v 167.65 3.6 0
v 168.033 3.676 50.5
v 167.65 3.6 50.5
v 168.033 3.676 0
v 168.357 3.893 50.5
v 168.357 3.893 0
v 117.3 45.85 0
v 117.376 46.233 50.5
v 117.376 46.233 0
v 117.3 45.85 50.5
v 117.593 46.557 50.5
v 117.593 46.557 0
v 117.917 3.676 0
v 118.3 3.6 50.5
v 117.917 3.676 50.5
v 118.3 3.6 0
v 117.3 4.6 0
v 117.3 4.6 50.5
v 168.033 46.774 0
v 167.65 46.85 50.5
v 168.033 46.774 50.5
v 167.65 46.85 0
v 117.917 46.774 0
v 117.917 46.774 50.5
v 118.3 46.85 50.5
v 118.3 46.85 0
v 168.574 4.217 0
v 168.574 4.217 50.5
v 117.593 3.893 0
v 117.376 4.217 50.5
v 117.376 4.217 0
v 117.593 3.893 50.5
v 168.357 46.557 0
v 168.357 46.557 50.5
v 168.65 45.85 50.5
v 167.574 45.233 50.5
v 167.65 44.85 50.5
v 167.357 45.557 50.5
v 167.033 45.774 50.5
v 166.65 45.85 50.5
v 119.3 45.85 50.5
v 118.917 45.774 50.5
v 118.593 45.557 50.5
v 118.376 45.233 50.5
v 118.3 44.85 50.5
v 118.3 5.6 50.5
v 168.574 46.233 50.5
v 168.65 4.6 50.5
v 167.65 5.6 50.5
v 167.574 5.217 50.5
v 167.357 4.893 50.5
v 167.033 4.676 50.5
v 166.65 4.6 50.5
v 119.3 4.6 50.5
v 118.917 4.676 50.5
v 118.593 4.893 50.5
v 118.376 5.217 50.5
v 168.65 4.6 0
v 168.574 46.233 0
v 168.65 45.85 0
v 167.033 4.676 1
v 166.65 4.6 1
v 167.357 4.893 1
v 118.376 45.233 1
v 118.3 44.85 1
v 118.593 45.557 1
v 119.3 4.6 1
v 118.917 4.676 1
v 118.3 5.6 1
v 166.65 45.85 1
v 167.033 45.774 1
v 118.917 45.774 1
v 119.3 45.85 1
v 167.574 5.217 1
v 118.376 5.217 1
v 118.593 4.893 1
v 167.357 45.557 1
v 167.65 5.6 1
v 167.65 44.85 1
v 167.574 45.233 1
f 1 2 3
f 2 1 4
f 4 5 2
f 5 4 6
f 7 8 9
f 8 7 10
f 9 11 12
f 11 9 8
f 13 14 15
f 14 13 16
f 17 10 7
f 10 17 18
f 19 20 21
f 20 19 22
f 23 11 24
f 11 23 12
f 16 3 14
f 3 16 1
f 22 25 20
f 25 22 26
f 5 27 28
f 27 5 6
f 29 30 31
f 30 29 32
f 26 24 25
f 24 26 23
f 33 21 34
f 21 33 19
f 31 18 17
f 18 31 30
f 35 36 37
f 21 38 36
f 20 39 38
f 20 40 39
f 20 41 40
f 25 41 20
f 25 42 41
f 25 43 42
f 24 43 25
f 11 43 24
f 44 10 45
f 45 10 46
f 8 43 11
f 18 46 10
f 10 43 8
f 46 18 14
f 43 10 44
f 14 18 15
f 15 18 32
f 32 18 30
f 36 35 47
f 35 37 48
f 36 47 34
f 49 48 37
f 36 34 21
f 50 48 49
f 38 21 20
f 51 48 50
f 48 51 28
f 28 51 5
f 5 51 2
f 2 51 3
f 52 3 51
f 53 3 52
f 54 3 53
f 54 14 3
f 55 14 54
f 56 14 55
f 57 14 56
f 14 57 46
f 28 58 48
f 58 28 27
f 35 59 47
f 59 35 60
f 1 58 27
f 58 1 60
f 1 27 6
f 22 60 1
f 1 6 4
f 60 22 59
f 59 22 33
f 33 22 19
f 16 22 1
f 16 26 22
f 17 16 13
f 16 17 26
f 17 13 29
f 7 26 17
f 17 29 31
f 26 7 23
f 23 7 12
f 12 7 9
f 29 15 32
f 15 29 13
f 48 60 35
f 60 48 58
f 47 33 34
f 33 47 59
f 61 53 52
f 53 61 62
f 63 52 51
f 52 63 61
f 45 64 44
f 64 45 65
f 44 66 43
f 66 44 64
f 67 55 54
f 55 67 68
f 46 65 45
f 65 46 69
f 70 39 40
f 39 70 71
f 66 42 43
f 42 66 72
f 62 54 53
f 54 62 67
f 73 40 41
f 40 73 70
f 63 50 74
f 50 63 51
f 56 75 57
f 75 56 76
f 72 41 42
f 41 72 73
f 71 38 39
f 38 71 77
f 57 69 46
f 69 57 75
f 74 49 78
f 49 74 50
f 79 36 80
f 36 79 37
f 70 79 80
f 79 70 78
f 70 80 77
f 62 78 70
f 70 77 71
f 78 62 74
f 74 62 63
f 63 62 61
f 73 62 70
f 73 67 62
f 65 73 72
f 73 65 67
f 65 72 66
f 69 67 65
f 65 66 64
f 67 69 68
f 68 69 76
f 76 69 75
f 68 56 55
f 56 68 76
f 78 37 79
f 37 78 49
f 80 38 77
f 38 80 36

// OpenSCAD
use <mylib.scad>;
// Organizer for GreatSeas box and components
// nine and half ship upgrade market holders
// four player component boxes: 
// --  action(6) & combat(16+8) cards, ships/dudes (29+2), point-markers, trade posts, ship-class & fleet tiles
// temple risers?, coin tray, wood tray, worker/damage/stat tray, "special action" (temple) cards


p = .001;
pp = 2 * p;
t0 = 1;
f = .18;      // fudge for physical clearance
f1 = .1;      // fudge for display
t2 = 2*t0;    // 2 walls
ty = 1.5 * t0;   // neutral box y-wall thickness

sample = false;  // true to print mini-box

cbw = 140;       // combat board
cbh = 100;
cbz = 8;

mapz = 11.5 + 2; // map thickness reduces availablbe box depth + rule book

// box size and placement constraint (3x4 grid in square box)
boxy = 220;    // internal XY-dim of cardboard box (components must fit within)
boxz = 65 - mapz;    // internal height of cardboard box (components must fit within)

// Garphill 54x86 cards
w00 = sample ? 27 : 54;  // official card size [short dimension]
h00 = sample ? 42 : 86;  // official card size [long dimension]

ds = 12;       // dice size

t00 = 8/24;    // = .333mm card thickness: sleeves 60 mics = .06 mm ==> .393 == .4 with sleeves?
t01 = .400;    // = .33 + .6 mm; thickness when stacking sleeved cards (compressed) TBD when sleeve arrive.

// width of card with sleeves
w0 = w00+2.5;
// height of card with sleeves
h0 = h00+1.5;
npc = 30;    // number of player cards
t1c = t0 * 1;//.7;
csz = t0 + (npc+4) * t01; // player box thick?

combatt = 5;    // thickness of combat status disks
combatd = 18;   // diameter of combat status disks (10 of them)
damaged = 8;    // x, y, z dimension of orange cube. (12 of them)
templed = 19;   // diameter of Temple disks

nTemple = 6;
nTempleCards = 24;        // number of 'special' action cards (4 x nTemples)
cardz = t01 * (nTempleCards + 4);

pdw = 216;   // playerBoard-x-width
pdh = 133;   // playerBoard-y-height
pdz = 21;    // playerBoard-z
pdo = 2;     // player board offset (in view)

// PlayerBox:
csw = h0 + t2;  // cardSection
csh = w0 + t2;
psz = 30;       // 3 cm depth

// (w0 x h0) sleeved card size
module card(n = 1, w = w0, h = h0, cz = t01, c = "lightblue") {
  // put cards in sideways orientation:
  astack(n, [0, 0, cz]) color(c) cube([w, h, cz*.9]);
}

module specialCards(n = nTempleCards) {
  card(n, h0, w0);
}

// hold 3 * (8 combat) + 6 * (1 Action) = 30 cards
module cardSection(npc = npc) {
  astack(2, [0, 0, csz + f1])
  astack(2, [csh+f1, 0, 0])
  roundedBox([csh, csw, csz], 1);
}
module partsSection() {
  csx = 2 * (csh + f1);
  psx = boxy - csx - f1;
  psy = boxy - pdh -.5;
  psz = boxz - t0;
  echo("psx, psy, psz = ", [psx, psy, psz]);
  trr([csx + f1, pdh-nty+f1, 0]) roundedBox([psx/2, psy/2, psz], 1);
  echo("parts volume: ", [psx/2, psy/2, psz], psx/2 * psy/2 * psz / 1000);
}
module neutralSection() {
  dy = pdh - nty;  // 3.5
  nsx = 2 * (csh + f1);
  nsy = csw - dy;
  nsz = boxz - 2 * (csz + f1);
  trr([0, dy+f1, 2 * csz + f1]) color("#ac8a45")
  roundedBox([nsx, nsy, nsz], 1);
  echo("neutral volume: ", [nsx/2, nsy/2, nsz], nsx * nsy * nsz / 1000);
}
module pboxLid() {
  inz = 3 + t0;
  cube([csw, csh, t0]);
  trr([t0, t0, t0-inz])
  box([csw-t2-f1, csh-t2-f1, inz], [t0, t0, -1], [2, 2, 1.1]);
}

module playerBox() {
  cardSection();
  csx = 2 * (csh + f1);
  psx = boxy - csx - f1;
  psy = boxy - pdh -.5;
  astack(2, [0, psy/2+f1, 0]) astack(2, [psx/2+f1, 0, 0])
  partsSection();
  neutralSection();
}

module combatBoard() {
  cbws = 68.0;     // central "tab" height (wide part < cbh = 100)
  cbhi = 87.8;     // width of narrow part (less than cbw = 140)
  c = "#ffec5ec1";// '#7fccf610'
  trr([0, cbh/2, cbz/2]) 
  {
    color(c) 
    roundedCube([cbw, cbhi, cbz], 3, true, true);
    color(c) 
    roundedCube([cbws, cbh, cbz-p], 3, true, true);
  }
}

tilez = 1.8;  // thickness of cardboard stock (1.78)
tilez9 = 9.5 * tilez;  // stack of 9 tiles

dw = 2.1;
bz0 = 2;         // taperBox base thickness

// size of neutral box:
ntx = boxy ;  // x-size of box
nty = pdh - 3.5;  // y-size of box (boxy - cbh - t2) ?
ntz = tilez9 + bz0 + 3 + 1;  // z-size of box (incl: lid & overhang) 
ntz0 = t0 + tilez9 + bz0 + t0;    // top of 'lid'
echo("nxt, nty, ntz =", [ntx, nty, ntz], "tilez9 + bz0 =", tilez9+bz0);

// rz: rotation around z-axis (while still centered around [0,0] )
module taperBox(w = 30, h = 24, z = tilez9, rz = 0) {
  // linearExtrude(taper) roundedRect(), cut finger slots on side and base
  dww = w + 2 * dw;
  dwh = h + 2 * dw;
  shz = z + bz0;
  cr = w/4;   // cylinder radius
  dy = dwh/2-dw/2;
  wh = (w + h)/2;
  module cut(r = cr, dir = 1) {
    trr([0, dir * dy, -p]) {
    scale([1,.5]) 
    trr([0, 0, (bz0+tilez9+2*pp)/2]) cylinder(h = bz0+tilez9+2*pp, r = r, center = true);
    trr([0, 0, bz0+(bz0+tilez9+pp)/2]) cube([2*r, dw + .1 +8*p, tilez9+bz0+pp], true);
    trr([0, dir*dw/2, (bz0+tilez9+pp)/2]) cube([2*r, dw + .1 +8*p, tilez9+bz0+pp], true);
    }
  }
  // extrude & rotate while centered; then offset from [0, 0]
  trr([dww/2, dwh/2, 0, [0, 0, rz]])
  difference() {
    linear_extrude(height = shz, scale = (wh + 2 * t0) / (wh + 2 * dw))
    trr([-dww/2, -dwh/2, 0]) roundedRect([dww, dwh], 1);
    trr([-w/2,   -h/2, bz0]) roundedCube([w, h, shz], .2, true); // tile
    cut(cr, -1);      // base slot & finger cut
    cut(cr, +1);      // base slot & finger cut
  }
}

shipw = 30.1;
shiph = 24.1;
shipdx = shipw + 2 * dw + .05;
shipdy = shiph + 2 * dw + .05;
shipx0 = ntx - dw - 3 * shipdx; 

module shipBox() {
  module aBox() {
    dwh = shiph + 2 * dw;
    color("blue") 
    trr([0, 0, 0, [0, 0, 0, [dwh/2, dwh/2, 0]]])
    taperBox(shipw, shiph, tilez9);
  }
  astack(3, [0, shipdy, 0])
  astack(3, [shipdx, 0, 0]) 
  trr([shipx0, 0, pp]) 
  aBox();
}

cardTrayw = h0 + 5 * t0;  // 2 endcaps + gaps? balance with h0 sleeve size
cardTrayh = w0 + 4 * t0;

fortw = 36.1;
forth = 18.1;
fortdx = fortw + 2 * dw + .1;
fortdy = forth + 2 * dw + .1;
fortx0 = t0;// + 3 * (shipw + 2 * dw);
forty0 = nty - ty - fortw - 2 * dw;
module fortBox() {
  module aBox(fortw = fortw) {
    dwh = forth + 2 * dw;
    trr([0, 0, 0, [0, 0, 90, [dwh/2, dwh/2, 0]]])
    color("red") taperBox(fortw, forth);
  }
  astack(9, [fortdy, 0, 0])
  // astack(2, [0, dy, 0])
  trr([fortx0 + f1, forty0 - f1, pp])
  aBox();
  // one half-size fort:
  trr([shipx0 - forth - 2 * dw - f1, 0, t0+pp])
  aBox(fortw/2);
}

module cardTray() {
  cx = cardTrayw; cy = cardTrayh; cz = tilez9;
  color("#5505f585")
  trr([0-p, ty-t0, 0-p]) 
  slotifyY2( [cz, 60, 3 * t0, 2], [cx/2, cy, 0], undef, 2, false )
  box([cx, cy, cz]);
}

coind = 23.2;
coinz = 1.8;  // stack of 30 <= 54mm

module coin () { cylinder(h = coinz, r = coind/2); }
module coinTray(n = 40) {
  cx = 4 * coind + 1.5 * t0 ; cy = coind+2*t0; cz = tilez9 + bz0 + .9;
  coinv = round(coind * coind * coinz * n); 
  box([cx+t2, cy+t0, cz]);
  // show the coins:
  astack(10, [0, 0, coinz])
  astack(4, [coind, 0, 0])
  trr([f1 + t0+coind/2, f1 + t0+coind/2, t0]) color("silver") cylinder(h = coinz, d = coind);
  echo("coinTray: cx, cy, cz", [cx, cy, cz], cx * cy * cz/1000, coinv/1000);
}
module woodTray(n = 40) {
  // wood: 6.6 x 14.6 x 7.4
  woodv = round( 6.6 * 14.6 * 7.4 * n);
  wx = cardTrayw-4*t0-2*f; wy = w0; wz = tilez9 + bz0 - cardz;
 * color("#611951f5")
  trr([t0+f1, t0+t2, 0 + cardz])
  box([wx+t2, wy+t2, wz+t0]);
  echo("woodTray: wx, wy, wz", [wx, wy, wz], wx * wy * wz/1000, woodv/1000);
}

module statDisks() {
  h = combatt; r = combatd/2;
  module statd() {
    cylinder(h = h, r = r);
  }
  astack(10, [0, h, 0], undef, ["red", "blue","green","orange","violet"])
  trr([0, 0, r, [-90, 0, 0]]) statd();
  // trr([-15.6, 3, 10, [0, 90, 0]]) color("violet") statd();
}

module temples() {
  h = tilez * 1; d = templed;  // templez could go up to 3.11!
  astack(nTemple, [0, h, 0], undef, "#fefcbc9a")
    trr([0, 0, d/2, [-90, 0, 0]]) cylinder(h = h*.9, d = d);
}

// cs: child size; begin grid @ (cs, cs+1)
// nc: columns
// nr: rows
module lidGrid(bw, bh, cs = 5, nc = undef, nr = undef) {
  nc = def(nc, bw/(2 * cs));
  nr = def(nr, bh/(2 * cs));
  x0 = cs;
  xi = (bw - cs) / nc;
  xm = bw - cs;
  y0 = cs + 1;
  yi = (bh - cs) / nr;
  ym = bh - cs;
  translate([0, 0, -t0])
  gridify([x0, xi, xm], [y0, yi, ym], 2) cube([cs, cs, cs]);
}

// f: enlarge for clearance when using as cut template
module neutralLid(f = 0) {
  color("#3e9eff3e") 
  trr([0-p, t0, ntz - 2* t0]) 
  difference() {
  cube([ntx-t0+f, nty-t2+f, t0+f]);
  if (f <= 0) lidGrid(ntx-t0, nty-t2, 5);
  }
  if (f > 0) {
    trr([0-p,        -p, ntz - 2* t0 ]) cube([3*t0+pp, nty+pp, t2+f]);
    trr([ntx-3*t0-p, -p, ntz - 2* t0 ]) cube([3*t0+pp, nty+pp, t2+f]);
  }
}

// temple risers?, coin tray, wood tray, 
// worker/damage/stat tray, "special action" (temple) cards
// 9 & 1/2 ship-upgrade tile holders
module neutralTray() {
  difference() {
    roundedBox([ntx, nty, ntz], 1, [t0, ty, t0]);
    neutralLid(.2);
  }

  trr([t0 + t0, ty + t0, t0]) specialCards();  // align with cardTray()

  trr([shipx0 - combatd/2 + 1.2, 10 + fortw/2 + 2*dw + 2*t0, t0])
    statDisks();

  trr([shipx0 - templed/2 + 1.2, fortw/2 + 4.4, t0])
    temples();

  atrans(loc, [[t0+f, cardTrayh +ty -t0 + f1, t0]])
    coinTray(40);

  atrans(loc, [[0, 0, t0]])
    woodTray();

  cardTray();

  trr([t0, ty+f1, t0]) shipBox();
  trr([t0, 0, t0]) fortBox();
  
  atrans(loc, [-1, [0,0,0]]) neutralLid();

}
module playerBoards() {
  color("#af49006a") cube([pdw, pdh, pdz]); // '#af4900'
}

// 0: all - assembled
// 1: playerBox
// 2: single partsSection
loc = 2; 

// if (loc == 0) astack(2, [csw+.2, 0, 0])
// if (loc == 0) astack(2, [0, csh+.2, 0])
atrans(loc, [[0, nty+f1, 0], [0, 0, 0]]) playerBox();
atrans(loc, [undef, 0, [0, 0, 0]]) partsSection();
echo("boxy-nty=", boxy-nty, "h0=", h0);


// neutral tray:
atrans(loc, [[0, 0, 0]]) trr([0, 0, 0]) neutralTray();
*atrans(loc, [[0, 0, 0]]) trr([0, 0, 0]) neutralLid();

// combat boards:
atrans(loc, [[0, 0, 0]]) trr([boxy/2, t0, ntz0]) combatBoard();

// playerBoards:
atrans(loc, [[0, 0, 0]]) trr([ pdo, 0, boxz-pdz]) playerBoards();

// outer box:
module outerBox(tb = .2) {
   trr([-tb-p, -tb-p, -tb-p]) color("#5756564a")
   box([boxy + 2*tb, boxy + 2*tb, boxz + tb], tb);
}
atrans(loc, [[0, 0, 0]]) outerBox(.02);
